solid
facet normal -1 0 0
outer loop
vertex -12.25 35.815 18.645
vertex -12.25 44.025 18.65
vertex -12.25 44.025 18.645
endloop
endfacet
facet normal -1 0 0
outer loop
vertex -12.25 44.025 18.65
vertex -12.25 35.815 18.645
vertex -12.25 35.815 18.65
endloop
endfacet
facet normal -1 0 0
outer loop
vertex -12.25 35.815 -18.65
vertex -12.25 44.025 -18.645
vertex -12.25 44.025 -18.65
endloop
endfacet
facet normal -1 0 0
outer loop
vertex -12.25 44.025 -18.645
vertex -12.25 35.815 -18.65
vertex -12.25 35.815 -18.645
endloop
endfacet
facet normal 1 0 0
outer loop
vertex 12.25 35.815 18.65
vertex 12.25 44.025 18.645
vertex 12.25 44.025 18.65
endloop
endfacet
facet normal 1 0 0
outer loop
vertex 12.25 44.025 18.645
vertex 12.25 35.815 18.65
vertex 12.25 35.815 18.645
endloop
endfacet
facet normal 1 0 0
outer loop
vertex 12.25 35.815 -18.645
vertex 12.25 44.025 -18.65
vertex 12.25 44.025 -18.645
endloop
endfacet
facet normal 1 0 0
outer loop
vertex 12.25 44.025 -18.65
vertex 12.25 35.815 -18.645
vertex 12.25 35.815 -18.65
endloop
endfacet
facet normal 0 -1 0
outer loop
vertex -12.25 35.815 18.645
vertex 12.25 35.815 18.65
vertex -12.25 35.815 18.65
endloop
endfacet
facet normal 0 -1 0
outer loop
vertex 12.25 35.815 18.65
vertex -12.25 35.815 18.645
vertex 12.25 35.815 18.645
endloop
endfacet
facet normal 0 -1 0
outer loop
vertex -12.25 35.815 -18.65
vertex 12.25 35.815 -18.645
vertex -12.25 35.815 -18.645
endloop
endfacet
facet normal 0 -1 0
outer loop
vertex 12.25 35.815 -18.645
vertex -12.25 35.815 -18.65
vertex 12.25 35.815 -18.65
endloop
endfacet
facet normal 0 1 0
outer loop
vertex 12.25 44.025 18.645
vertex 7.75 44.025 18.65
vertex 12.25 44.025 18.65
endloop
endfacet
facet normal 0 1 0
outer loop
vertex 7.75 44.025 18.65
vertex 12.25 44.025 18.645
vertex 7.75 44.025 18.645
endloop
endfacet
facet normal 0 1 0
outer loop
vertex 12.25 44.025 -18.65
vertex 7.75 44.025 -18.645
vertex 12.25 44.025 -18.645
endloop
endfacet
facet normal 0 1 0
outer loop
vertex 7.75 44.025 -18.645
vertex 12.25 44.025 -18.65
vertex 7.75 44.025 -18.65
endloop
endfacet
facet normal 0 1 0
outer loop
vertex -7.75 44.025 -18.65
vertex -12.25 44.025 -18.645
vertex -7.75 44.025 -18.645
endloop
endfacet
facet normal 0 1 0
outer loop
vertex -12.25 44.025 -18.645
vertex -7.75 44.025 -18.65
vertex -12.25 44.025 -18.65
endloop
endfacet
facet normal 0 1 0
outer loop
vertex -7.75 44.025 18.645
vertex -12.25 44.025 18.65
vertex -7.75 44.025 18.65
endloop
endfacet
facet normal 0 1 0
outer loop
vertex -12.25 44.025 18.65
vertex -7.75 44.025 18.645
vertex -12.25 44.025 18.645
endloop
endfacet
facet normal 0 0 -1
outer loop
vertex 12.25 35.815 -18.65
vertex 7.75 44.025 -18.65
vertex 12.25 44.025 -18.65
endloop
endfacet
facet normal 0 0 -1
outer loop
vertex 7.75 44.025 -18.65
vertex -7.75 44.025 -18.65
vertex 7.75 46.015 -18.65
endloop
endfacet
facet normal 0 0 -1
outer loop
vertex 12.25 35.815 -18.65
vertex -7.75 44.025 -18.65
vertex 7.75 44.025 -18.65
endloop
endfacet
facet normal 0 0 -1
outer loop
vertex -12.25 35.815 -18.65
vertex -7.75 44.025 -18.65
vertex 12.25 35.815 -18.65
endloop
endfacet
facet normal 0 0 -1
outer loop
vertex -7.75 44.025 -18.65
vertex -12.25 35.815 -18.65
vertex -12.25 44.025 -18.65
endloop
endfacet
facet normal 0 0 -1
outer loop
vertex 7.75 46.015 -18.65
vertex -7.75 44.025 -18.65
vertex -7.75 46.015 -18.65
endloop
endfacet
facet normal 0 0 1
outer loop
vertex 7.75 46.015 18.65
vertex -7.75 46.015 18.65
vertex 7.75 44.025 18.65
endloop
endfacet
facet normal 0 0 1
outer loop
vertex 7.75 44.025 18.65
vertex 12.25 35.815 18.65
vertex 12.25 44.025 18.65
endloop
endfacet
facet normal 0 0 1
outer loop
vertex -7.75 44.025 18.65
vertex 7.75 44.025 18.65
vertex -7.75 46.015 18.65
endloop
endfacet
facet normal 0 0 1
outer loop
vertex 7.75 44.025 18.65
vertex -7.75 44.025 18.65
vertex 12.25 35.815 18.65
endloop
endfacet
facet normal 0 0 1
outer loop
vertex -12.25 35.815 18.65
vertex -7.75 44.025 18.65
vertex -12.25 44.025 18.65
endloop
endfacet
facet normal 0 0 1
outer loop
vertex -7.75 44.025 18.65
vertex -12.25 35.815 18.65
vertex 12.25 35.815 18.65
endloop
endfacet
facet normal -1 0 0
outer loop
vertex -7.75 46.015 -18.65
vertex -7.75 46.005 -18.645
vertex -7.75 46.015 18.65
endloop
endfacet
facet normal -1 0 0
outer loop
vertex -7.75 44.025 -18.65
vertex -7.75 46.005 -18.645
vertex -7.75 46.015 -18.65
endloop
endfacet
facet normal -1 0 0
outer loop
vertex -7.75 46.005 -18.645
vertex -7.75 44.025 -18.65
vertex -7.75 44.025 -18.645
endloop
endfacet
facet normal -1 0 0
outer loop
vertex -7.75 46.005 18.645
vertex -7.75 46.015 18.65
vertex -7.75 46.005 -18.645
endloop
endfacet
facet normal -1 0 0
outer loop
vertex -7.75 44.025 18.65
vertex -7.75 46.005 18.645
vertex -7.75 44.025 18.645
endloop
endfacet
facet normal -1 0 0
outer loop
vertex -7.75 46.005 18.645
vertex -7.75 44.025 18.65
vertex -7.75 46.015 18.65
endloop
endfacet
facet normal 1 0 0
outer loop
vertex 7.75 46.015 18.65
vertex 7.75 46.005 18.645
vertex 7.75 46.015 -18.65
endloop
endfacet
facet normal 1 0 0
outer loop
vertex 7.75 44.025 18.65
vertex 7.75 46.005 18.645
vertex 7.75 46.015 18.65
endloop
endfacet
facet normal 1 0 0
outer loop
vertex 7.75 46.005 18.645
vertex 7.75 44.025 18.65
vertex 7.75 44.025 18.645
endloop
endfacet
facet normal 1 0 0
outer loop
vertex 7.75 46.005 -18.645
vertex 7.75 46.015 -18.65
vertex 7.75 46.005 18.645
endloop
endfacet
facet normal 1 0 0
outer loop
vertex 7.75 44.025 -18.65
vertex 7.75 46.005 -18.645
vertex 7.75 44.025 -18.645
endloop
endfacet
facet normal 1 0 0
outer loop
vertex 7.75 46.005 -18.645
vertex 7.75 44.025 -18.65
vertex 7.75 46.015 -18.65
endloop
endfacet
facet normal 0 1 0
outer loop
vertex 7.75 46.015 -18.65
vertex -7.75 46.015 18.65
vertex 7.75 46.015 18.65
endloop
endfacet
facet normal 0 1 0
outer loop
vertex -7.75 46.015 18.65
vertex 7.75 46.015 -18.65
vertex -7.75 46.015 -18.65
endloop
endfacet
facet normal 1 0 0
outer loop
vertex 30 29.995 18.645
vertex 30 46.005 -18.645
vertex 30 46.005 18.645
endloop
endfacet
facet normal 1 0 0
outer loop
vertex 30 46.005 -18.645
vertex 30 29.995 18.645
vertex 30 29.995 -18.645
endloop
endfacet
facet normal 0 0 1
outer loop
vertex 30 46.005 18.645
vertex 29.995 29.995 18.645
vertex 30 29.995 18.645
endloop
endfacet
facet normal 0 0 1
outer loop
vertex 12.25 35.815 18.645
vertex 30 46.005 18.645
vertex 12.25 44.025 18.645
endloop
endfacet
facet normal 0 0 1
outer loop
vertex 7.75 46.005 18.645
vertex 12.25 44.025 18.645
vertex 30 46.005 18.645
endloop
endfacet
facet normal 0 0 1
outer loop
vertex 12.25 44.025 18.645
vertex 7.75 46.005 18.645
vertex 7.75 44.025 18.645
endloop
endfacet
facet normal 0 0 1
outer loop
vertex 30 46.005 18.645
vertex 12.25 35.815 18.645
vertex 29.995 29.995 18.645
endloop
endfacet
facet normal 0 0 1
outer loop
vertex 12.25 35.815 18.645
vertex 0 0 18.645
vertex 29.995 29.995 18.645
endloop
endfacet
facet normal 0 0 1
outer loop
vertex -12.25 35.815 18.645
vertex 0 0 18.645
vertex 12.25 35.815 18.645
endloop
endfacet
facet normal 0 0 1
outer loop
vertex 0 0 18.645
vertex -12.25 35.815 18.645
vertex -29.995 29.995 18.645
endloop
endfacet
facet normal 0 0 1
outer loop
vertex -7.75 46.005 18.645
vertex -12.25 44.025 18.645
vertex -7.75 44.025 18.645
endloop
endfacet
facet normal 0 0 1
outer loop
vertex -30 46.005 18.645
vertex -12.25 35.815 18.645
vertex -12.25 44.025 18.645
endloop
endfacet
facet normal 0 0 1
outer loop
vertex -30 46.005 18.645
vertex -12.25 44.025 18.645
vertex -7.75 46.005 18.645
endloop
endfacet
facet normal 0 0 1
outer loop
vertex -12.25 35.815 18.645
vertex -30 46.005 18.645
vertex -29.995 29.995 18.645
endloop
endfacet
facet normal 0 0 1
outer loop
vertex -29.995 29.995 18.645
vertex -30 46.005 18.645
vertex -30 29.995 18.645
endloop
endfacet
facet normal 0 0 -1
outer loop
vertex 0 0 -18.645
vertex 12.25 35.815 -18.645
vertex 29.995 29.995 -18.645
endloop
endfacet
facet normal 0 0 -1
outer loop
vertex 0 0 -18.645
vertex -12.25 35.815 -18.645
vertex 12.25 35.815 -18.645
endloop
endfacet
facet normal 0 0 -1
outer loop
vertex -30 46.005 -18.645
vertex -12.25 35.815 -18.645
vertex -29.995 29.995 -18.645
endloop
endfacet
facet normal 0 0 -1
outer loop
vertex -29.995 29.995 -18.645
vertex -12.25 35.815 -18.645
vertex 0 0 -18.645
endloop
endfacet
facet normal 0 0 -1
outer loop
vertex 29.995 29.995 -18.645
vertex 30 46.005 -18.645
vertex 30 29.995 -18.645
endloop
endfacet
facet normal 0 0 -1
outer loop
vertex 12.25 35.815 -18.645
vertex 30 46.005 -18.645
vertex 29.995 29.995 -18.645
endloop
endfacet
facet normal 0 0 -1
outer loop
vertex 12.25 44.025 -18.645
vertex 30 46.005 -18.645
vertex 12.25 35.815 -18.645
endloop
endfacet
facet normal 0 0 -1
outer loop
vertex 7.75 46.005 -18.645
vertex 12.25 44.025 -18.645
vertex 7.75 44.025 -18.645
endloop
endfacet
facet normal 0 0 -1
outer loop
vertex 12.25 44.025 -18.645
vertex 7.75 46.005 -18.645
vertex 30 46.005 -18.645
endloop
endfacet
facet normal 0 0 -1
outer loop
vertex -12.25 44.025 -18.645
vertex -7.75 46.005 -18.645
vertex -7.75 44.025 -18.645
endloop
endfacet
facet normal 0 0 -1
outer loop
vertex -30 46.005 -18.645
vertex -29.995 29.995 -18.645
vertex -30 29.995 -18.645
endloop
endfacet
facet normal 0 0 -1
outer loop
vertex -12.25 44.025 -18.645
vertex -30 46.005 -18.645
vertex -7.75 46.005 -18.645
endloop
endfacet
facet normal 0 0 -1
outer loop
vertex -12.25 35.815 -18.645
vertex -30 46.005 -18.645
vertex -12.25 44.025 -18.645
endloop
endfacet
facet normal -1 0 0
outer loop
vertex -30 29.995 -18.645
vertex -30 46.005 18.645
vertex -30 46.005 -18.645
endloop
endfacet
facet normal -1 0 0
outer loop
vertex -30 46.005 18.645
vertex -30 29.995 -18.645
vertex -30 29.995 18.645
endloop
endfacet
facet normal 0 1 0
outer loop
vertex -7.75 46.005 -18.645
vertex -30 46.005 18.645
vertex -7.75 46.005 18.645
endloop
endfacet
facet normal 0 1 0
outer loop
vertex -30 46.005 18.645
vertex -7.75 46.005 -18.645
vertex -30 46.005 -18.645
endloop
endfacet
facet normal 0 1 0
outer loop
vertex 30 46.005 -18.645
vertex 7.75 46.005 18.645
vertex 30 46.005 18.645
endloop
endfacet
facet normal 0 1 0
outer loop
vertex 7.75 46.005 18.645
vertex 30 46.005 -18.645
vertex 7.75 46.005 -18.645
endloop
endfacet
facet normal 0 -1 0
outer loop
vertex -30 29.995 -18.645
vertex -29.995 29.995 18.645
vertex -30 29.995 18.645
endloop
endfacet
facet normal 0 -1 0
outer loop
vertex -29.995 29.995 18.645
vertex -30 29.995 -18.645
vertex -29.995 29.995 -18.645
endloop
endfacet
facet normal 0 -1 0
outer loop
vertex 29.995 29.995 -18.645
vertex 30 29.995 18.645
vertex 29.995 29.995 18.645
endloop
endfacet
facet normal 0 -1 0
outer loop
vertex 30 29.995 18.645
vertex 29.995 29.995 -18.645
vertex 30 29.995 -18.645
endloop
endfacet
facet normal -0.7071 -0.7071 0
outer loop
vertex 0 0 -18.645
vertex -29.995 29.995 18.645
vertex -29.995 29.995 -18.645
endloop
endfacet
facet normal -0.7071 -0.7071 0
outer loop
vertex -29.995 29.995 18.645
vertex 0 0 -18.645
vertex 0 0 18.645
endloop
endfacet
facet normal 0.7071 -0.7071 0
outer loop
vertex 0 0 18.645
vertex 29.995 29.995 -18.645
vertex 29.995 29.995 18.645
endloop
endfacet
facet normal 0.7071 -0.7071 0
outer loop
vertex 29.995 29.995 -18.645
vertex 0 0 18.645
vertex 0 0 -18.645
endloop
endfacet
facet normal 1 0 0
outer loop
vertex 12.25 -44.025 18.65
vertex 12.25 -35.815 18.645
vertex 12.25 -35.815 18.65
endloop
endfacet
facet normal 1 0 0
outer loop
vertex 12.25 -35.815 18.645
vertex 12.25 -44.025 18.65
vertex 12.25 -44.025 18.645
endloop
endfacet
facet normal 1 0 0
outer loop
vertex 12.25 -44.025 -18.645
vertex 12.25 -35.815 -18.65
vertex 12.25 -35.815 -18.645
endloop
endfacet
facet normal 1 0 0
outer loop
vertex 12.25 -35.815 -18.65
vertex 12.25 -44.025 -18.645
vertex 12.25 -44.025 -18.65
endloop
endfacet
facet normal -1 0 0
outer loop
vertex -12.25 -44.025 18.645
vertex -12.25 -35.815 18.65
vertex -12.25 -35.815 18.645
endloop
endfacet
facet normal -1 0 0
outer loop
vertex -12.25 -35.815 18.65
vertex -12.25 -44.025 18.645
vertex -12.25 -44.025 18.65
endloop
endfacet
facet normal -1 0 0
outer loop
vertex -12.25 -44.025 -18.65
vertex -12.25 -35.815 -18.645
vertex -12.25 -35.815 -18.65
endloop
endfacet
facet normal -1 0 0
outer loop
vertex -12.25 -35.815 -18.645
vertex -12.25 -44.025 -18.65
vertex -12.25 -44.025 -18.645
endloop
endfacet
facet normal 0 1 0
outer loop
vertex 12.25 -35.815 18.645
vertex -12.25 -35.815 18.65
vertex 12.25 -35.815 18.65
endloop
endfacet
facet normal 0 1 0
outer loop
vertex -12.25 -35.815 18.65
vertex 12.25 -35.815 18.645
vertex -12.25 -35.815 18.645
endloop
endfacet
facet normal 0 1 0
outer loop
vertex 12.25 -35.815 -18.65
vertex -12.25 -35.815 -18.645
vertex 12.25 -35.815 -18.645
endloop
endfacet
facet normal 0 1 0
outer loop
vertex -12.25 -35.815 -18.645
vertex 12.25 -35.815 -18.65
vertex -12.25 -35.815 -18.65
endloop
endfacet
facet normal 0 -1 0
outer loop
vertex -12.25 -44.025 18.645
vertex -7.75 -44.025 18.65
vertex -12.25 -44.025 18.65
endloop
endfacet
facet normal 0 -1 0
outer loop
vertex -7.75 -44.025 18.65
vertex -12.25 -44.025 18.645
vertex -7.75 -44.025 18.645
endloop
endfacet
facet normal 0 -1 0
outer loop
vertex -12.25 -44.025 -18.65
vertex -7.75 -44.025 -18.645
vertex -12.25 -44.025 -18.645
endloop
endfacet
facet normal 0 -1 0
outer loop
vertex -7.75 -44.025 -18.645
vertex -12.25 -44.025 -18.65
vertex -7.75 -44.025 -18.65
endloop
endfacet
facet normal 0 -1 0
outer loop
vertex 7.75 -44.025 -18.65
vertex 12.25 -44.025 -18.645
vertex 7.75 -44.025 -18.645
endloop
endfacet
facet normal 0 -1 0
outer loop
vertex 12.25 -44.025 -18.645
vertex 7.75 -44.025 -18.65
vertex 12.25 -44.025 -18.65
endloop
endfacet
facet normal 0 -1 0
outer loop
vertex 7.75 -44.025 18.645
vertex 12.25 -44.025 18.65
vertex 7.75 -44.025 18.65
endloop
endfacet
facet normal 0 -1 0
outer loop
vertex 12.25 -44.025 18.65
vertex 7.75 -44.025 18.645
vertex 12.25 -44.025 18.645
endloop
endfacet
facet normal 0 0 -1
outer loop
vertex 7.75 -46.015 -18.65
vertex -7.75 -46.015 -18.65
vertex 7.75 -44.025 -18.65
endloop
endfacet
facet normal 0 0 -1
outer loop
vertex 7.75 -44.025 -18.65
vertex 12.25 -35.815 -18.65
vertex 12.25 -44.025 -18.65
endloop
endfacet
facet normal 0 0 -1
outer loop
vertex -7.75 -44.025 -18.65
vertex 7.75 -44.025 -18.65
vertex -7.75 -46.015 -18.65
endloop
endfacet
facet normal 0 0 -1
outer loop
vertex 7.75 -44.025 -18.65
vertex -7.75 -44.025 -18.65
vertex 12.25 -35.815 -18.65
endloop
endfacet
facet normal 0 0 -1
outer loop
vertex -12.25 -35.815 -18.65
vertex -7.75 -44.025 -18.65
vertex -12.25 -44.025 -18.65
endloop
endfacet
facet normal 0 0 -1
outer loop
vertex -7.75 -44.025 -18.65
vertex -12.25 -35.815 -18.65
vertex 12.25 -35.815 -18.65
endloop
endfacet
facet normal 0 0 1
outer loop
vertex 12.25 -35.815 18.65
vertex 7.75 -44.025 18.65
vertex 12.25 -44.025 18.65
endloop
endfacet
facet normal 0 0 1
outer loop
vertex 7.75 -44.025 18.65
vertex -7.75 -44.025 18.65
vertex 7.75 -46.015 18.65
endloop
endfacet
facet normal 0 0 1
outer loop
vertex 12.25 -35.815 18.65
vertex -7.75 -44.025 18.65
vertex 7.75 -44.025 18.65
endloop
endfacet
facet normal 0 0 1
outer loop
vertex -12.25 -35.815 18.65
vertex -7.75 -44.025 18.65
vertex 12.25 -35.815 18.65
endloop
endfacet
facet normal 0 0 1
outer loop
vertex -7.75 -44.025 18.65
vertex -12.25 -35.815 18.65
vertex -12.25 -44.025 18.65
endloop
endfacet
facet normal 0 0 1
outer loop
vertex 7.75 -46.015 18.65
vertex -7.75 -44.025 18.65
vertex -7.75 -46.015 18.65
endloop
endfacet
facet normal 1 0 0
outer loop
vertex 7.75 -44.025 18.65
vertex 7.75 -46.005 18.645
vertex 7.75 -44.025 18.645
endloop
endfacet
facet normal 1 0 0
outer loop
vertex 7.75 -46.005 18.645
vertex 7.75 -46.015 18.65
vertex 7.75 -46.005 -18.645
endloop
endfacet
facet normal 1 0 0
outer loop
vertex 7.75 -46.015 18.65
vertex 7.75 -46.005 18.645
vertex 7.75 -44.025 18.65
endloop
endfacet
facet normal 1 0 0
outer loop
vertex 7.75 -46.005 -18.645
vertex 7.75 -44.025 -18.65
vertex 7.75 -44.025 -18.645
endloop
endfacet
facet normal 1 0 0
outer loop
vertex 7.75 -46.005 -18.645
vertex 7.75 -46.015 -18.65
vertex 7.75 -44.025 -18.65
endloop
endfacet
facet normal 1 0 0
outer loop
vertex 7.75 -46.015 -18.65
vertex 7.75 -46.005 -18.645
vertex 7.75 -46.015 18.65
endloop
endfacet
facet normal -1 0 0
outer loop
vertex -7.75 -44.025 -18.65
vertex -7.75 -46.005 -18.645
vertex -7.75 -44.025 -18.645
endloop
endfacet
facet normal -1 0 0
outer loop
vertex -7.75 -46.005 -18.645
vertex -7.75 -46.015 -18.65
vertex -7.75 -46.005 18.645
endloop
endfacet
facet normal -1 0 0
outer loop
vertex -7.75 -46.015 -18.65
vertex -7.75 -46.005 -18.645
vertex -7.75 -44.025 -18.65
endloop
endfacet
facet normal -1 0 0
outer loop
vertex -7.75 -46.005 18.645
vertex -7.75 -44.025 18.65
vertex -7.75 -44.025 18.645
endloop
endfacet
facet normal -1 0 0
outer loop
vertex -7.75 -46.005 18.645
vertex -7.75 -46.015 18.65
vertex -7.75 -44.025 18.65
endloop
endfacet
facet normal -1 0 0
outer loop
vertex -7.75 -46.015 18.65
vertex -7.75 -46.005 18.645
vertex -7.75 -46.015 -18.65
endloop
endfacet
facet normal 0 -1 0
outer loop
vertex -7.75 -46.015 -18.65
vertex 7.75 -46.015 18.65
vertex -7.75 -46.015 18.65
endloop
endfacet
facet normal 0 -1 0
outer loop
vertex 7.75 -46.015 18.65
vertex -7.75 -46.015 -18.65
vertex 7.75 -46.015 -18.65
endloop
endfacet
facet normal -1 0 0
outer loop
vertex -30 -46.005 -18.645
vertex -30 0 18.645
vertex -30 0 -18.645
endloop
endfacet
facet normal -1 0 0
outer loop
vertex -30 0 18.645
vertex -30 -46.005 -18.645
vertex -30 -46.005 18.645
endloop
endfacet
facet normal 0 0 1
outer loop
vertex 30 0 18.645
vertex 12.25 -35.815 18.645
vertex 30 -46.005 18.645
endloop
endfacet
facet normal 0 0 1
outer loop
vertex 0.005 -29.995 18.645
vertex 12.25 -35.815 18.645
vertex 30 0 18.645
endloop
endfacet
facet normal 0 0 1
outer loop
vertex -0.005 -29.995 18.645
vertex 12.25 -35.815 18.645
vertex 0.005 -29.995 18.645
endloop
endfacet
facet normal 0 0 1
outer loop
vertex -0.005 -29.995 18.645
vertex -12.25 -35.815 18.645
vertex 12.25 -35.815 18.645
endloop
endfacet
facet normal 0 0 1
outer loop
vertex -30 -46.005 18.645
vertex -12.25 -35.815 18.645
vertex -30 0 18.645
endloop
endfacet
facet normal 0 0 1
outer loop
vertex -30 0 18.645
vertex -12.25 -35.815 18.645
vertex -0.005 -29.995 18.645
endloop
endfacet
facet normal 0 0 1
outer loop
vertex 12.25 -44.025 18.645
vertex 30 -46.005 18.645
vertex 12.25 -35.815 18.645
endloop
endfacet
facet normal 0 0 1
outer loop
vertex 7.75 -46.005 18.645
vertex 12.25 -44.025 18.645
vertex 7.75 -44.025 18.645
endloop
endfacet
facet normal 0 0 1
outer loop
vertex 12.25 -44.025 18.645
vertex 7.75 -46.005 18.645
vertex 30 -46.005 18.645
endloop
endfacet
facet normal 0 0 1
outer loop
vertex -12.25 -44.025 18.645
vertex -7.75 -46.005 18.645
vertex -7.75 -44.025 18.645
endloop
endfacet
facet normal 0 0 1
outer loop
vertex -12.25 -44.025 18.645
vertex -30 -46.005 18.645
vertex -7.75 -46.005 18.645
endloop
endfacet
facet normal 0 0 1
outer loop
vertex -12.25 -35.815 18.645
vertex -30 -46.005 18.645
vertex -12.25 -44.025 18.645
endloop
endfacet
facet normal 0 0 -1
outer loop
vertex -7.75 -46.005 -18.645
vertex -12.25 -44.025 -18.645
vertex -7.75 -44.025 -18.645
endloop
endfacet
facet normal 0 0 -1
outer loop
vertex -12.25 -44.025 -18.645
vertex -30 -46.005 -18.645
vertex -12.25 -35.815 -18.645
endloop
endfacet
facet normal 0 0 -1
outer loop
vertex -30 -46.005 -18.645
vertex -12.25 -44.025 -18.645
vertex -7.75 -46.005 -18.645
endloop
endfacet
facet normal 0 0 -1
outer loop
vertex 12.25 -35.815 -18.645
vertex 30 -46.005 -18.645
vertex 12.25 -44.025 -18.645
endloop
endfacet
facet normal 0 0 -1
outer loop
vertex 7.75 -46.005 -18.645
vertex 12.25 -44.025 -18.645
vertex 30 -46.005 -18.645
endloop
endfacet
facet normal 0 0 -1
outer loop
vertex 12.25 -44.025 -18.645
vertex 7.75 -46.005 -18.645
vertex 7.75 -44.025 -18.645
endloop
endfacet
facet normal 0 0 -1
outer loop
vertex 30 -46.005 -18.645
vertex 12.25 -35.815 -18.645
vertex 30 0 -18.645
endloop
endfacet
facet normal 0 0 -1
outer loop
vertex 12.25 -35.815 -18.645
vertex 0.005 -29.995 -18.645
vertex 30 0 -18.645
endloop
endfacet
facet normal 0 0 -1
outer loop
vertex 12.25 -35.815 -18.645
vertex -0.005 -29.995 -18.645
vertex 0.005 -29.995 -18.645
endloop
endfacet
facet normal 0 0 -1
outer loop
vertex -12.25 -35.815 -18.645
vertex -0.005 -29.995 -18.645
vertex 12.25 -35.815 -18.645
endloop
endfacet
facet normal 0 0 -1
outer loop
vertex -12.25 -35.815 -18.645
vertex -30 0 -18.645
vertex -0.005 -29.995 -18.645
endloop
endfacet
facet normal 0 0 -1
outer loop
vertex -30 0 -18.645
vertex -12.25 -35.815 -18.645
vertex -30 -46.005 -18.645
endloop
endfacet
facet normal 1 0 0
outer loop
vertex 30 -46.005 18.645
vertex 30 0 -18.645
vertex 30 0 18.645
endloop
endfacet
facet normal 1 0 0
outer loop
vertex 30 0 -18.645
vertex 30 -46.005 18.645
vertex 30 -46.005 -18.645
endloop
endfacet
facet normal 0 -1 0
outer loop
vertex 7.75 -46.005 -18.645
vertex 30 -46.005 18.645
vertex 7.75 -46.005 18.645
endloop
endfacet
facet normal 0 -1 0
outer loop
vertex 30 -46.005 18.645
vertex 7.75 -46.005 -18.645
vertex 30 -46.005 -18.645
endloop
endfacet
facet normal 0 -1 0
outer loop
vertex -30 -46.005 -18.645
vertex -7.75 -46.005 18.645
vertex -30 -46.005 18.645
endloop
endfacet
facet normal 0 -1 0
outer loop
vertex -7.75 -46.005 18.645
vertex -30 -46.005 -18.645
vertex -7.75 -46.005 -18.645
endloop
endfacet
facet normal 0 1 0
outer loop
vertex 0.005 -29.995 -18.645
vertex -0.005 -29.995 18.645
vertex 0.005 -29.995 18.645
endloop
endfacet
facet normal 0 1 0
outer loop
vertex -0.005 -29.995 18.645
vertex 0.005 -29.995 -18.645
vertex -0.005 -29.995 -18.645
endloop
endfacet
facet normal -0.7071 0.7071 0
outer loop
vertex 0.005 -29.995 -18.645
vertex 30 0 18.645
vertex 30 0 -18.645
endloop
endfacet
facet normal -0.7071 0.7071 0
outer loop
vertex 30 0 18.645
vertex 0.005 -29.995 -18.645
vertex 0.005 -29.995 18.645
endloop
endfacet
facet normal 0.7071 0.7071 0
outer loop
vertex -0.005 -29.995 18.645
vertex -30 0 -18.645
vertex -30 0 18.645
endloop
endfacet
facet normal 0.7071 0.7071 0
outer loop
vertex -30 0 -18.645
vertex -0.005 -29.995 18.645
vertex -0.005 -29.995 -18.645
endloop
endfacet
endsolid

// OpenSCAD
/*
Copyright (C) Saeed Gholami Shahbandi. All rights reserved.
Author: Saeed Gholami Shahbandi (saeed.gh.sh@gmail.com)

This file is part of Arrangement Library.
The of Arrangement Library is free software: you can redistribute it and/or
modify it under the terms of the GNU Lesser General Public License as published
by the Free Software Foundation, either version 3 of the License,
or (at your option) any later version.

This program is distributed in the hope that it will be useful, but WITHOUT ANY
WARRANTY; without even the implied warranty of MERCHANTABILITY or FITNESS FOR A
PARTICULAR PURPOSE. See the GNU Lesser General Public License for more details.

You should have received a copy of the GNU Lesser General Public License along
with this program. If not, see <http://www.gnu.org/licenses/>
*/

tol = 0.01;
thickness = 2;
alpha_1 = 1.0;
alpha_0_5 = 0.5;

// cocraft linear clamp 150mm
// ignoring the rounded corners and approximating the whole pad with a box/cube
pad_width = 24 + 0.5;
pad_length = 37.3;
pad_height = 8.0 + 0.2;
pad_connect_width = 15.3 + 0.2;
pad_connect_length = pad_length;
pad_connect_height = 2;

// base
base_width = 60;
base_lengh = 16;
base_height = pad_length- tol;  // 50;

// for the corner and wedge
clamp_width = base_width;
clamp_lengh = base_width / 2;
clamp_height = base_height;

module cocraft_pad(){
    color("CornflowerBlue", alpha_0_5)
    translate([0, -pad_connect_height+tol, 0])
    union(){
        let(x = pad_width,
            y = pad_length,
            z = pad_height)
        {
            translate([0, -z/2+tol, 0])
            rotate([90, 0, 0])
            cube([x, y, z+tol], center=true);
        }
        let(x = pad_connect_width,
            y = pad_connect_length,
            z = pad_connect_height)
        {
            translate([0, +z/2, 0])
            rotate([90, 0, 0])
            cube([x, y, z+tol], center=true);
        }
    }
}

module adapter() {
    color("IndianRed", alpha_1)
    let(x = base_width,
        y = base_lengh,
        z = base_height)
    {
        difference(){
            translate([0, -y/2, 0])
            cube([x, y+tol, z], center=true);
            cocraft_pad();
        }
    }
}

module corner(){
    color("DarkRed", alpha_1){
        adapter();
        let(x = clamp_width,
            y = clamp_lengh,
            z = clamp_height,
            dy = base_lengh)
        {
            translate([0, -y/2 - dy, 0])
            difference(){
                cube([x, y, z], center=true);

                d = y * sqrt(2);
                translate([0, -y/2, 0])
                rotate([0, 0, 45])
                cube([d, d, z+tol], center=true);
            }
        }
    }
}

module wedge(){
    color("DarkRed", alpha_1){
        adapter();
        let(x = clamp_width,
            y = clamp_lengh,
            z = clamp_height,
            dy = base_lengh)
        {
            translate([0, - dy, 0])
            difference(){
                d = y * sqrt(2);
                rotate([0, 0, 45])
                cube([d, d, z], center=true);

                translate([0, x/2, 0])
                cube([x, x, z+tol], center=true);
            }
        }
    }
}

translate([0, clamp_lengh + base_lengh, 0])
{
    cocraft_pad();
    wedge();
}

translate([0, -(clamp_lengh + base_lengh), 0])
rotate([0, 0, 180])
{
    cocraft_pad();
    corner();
}
